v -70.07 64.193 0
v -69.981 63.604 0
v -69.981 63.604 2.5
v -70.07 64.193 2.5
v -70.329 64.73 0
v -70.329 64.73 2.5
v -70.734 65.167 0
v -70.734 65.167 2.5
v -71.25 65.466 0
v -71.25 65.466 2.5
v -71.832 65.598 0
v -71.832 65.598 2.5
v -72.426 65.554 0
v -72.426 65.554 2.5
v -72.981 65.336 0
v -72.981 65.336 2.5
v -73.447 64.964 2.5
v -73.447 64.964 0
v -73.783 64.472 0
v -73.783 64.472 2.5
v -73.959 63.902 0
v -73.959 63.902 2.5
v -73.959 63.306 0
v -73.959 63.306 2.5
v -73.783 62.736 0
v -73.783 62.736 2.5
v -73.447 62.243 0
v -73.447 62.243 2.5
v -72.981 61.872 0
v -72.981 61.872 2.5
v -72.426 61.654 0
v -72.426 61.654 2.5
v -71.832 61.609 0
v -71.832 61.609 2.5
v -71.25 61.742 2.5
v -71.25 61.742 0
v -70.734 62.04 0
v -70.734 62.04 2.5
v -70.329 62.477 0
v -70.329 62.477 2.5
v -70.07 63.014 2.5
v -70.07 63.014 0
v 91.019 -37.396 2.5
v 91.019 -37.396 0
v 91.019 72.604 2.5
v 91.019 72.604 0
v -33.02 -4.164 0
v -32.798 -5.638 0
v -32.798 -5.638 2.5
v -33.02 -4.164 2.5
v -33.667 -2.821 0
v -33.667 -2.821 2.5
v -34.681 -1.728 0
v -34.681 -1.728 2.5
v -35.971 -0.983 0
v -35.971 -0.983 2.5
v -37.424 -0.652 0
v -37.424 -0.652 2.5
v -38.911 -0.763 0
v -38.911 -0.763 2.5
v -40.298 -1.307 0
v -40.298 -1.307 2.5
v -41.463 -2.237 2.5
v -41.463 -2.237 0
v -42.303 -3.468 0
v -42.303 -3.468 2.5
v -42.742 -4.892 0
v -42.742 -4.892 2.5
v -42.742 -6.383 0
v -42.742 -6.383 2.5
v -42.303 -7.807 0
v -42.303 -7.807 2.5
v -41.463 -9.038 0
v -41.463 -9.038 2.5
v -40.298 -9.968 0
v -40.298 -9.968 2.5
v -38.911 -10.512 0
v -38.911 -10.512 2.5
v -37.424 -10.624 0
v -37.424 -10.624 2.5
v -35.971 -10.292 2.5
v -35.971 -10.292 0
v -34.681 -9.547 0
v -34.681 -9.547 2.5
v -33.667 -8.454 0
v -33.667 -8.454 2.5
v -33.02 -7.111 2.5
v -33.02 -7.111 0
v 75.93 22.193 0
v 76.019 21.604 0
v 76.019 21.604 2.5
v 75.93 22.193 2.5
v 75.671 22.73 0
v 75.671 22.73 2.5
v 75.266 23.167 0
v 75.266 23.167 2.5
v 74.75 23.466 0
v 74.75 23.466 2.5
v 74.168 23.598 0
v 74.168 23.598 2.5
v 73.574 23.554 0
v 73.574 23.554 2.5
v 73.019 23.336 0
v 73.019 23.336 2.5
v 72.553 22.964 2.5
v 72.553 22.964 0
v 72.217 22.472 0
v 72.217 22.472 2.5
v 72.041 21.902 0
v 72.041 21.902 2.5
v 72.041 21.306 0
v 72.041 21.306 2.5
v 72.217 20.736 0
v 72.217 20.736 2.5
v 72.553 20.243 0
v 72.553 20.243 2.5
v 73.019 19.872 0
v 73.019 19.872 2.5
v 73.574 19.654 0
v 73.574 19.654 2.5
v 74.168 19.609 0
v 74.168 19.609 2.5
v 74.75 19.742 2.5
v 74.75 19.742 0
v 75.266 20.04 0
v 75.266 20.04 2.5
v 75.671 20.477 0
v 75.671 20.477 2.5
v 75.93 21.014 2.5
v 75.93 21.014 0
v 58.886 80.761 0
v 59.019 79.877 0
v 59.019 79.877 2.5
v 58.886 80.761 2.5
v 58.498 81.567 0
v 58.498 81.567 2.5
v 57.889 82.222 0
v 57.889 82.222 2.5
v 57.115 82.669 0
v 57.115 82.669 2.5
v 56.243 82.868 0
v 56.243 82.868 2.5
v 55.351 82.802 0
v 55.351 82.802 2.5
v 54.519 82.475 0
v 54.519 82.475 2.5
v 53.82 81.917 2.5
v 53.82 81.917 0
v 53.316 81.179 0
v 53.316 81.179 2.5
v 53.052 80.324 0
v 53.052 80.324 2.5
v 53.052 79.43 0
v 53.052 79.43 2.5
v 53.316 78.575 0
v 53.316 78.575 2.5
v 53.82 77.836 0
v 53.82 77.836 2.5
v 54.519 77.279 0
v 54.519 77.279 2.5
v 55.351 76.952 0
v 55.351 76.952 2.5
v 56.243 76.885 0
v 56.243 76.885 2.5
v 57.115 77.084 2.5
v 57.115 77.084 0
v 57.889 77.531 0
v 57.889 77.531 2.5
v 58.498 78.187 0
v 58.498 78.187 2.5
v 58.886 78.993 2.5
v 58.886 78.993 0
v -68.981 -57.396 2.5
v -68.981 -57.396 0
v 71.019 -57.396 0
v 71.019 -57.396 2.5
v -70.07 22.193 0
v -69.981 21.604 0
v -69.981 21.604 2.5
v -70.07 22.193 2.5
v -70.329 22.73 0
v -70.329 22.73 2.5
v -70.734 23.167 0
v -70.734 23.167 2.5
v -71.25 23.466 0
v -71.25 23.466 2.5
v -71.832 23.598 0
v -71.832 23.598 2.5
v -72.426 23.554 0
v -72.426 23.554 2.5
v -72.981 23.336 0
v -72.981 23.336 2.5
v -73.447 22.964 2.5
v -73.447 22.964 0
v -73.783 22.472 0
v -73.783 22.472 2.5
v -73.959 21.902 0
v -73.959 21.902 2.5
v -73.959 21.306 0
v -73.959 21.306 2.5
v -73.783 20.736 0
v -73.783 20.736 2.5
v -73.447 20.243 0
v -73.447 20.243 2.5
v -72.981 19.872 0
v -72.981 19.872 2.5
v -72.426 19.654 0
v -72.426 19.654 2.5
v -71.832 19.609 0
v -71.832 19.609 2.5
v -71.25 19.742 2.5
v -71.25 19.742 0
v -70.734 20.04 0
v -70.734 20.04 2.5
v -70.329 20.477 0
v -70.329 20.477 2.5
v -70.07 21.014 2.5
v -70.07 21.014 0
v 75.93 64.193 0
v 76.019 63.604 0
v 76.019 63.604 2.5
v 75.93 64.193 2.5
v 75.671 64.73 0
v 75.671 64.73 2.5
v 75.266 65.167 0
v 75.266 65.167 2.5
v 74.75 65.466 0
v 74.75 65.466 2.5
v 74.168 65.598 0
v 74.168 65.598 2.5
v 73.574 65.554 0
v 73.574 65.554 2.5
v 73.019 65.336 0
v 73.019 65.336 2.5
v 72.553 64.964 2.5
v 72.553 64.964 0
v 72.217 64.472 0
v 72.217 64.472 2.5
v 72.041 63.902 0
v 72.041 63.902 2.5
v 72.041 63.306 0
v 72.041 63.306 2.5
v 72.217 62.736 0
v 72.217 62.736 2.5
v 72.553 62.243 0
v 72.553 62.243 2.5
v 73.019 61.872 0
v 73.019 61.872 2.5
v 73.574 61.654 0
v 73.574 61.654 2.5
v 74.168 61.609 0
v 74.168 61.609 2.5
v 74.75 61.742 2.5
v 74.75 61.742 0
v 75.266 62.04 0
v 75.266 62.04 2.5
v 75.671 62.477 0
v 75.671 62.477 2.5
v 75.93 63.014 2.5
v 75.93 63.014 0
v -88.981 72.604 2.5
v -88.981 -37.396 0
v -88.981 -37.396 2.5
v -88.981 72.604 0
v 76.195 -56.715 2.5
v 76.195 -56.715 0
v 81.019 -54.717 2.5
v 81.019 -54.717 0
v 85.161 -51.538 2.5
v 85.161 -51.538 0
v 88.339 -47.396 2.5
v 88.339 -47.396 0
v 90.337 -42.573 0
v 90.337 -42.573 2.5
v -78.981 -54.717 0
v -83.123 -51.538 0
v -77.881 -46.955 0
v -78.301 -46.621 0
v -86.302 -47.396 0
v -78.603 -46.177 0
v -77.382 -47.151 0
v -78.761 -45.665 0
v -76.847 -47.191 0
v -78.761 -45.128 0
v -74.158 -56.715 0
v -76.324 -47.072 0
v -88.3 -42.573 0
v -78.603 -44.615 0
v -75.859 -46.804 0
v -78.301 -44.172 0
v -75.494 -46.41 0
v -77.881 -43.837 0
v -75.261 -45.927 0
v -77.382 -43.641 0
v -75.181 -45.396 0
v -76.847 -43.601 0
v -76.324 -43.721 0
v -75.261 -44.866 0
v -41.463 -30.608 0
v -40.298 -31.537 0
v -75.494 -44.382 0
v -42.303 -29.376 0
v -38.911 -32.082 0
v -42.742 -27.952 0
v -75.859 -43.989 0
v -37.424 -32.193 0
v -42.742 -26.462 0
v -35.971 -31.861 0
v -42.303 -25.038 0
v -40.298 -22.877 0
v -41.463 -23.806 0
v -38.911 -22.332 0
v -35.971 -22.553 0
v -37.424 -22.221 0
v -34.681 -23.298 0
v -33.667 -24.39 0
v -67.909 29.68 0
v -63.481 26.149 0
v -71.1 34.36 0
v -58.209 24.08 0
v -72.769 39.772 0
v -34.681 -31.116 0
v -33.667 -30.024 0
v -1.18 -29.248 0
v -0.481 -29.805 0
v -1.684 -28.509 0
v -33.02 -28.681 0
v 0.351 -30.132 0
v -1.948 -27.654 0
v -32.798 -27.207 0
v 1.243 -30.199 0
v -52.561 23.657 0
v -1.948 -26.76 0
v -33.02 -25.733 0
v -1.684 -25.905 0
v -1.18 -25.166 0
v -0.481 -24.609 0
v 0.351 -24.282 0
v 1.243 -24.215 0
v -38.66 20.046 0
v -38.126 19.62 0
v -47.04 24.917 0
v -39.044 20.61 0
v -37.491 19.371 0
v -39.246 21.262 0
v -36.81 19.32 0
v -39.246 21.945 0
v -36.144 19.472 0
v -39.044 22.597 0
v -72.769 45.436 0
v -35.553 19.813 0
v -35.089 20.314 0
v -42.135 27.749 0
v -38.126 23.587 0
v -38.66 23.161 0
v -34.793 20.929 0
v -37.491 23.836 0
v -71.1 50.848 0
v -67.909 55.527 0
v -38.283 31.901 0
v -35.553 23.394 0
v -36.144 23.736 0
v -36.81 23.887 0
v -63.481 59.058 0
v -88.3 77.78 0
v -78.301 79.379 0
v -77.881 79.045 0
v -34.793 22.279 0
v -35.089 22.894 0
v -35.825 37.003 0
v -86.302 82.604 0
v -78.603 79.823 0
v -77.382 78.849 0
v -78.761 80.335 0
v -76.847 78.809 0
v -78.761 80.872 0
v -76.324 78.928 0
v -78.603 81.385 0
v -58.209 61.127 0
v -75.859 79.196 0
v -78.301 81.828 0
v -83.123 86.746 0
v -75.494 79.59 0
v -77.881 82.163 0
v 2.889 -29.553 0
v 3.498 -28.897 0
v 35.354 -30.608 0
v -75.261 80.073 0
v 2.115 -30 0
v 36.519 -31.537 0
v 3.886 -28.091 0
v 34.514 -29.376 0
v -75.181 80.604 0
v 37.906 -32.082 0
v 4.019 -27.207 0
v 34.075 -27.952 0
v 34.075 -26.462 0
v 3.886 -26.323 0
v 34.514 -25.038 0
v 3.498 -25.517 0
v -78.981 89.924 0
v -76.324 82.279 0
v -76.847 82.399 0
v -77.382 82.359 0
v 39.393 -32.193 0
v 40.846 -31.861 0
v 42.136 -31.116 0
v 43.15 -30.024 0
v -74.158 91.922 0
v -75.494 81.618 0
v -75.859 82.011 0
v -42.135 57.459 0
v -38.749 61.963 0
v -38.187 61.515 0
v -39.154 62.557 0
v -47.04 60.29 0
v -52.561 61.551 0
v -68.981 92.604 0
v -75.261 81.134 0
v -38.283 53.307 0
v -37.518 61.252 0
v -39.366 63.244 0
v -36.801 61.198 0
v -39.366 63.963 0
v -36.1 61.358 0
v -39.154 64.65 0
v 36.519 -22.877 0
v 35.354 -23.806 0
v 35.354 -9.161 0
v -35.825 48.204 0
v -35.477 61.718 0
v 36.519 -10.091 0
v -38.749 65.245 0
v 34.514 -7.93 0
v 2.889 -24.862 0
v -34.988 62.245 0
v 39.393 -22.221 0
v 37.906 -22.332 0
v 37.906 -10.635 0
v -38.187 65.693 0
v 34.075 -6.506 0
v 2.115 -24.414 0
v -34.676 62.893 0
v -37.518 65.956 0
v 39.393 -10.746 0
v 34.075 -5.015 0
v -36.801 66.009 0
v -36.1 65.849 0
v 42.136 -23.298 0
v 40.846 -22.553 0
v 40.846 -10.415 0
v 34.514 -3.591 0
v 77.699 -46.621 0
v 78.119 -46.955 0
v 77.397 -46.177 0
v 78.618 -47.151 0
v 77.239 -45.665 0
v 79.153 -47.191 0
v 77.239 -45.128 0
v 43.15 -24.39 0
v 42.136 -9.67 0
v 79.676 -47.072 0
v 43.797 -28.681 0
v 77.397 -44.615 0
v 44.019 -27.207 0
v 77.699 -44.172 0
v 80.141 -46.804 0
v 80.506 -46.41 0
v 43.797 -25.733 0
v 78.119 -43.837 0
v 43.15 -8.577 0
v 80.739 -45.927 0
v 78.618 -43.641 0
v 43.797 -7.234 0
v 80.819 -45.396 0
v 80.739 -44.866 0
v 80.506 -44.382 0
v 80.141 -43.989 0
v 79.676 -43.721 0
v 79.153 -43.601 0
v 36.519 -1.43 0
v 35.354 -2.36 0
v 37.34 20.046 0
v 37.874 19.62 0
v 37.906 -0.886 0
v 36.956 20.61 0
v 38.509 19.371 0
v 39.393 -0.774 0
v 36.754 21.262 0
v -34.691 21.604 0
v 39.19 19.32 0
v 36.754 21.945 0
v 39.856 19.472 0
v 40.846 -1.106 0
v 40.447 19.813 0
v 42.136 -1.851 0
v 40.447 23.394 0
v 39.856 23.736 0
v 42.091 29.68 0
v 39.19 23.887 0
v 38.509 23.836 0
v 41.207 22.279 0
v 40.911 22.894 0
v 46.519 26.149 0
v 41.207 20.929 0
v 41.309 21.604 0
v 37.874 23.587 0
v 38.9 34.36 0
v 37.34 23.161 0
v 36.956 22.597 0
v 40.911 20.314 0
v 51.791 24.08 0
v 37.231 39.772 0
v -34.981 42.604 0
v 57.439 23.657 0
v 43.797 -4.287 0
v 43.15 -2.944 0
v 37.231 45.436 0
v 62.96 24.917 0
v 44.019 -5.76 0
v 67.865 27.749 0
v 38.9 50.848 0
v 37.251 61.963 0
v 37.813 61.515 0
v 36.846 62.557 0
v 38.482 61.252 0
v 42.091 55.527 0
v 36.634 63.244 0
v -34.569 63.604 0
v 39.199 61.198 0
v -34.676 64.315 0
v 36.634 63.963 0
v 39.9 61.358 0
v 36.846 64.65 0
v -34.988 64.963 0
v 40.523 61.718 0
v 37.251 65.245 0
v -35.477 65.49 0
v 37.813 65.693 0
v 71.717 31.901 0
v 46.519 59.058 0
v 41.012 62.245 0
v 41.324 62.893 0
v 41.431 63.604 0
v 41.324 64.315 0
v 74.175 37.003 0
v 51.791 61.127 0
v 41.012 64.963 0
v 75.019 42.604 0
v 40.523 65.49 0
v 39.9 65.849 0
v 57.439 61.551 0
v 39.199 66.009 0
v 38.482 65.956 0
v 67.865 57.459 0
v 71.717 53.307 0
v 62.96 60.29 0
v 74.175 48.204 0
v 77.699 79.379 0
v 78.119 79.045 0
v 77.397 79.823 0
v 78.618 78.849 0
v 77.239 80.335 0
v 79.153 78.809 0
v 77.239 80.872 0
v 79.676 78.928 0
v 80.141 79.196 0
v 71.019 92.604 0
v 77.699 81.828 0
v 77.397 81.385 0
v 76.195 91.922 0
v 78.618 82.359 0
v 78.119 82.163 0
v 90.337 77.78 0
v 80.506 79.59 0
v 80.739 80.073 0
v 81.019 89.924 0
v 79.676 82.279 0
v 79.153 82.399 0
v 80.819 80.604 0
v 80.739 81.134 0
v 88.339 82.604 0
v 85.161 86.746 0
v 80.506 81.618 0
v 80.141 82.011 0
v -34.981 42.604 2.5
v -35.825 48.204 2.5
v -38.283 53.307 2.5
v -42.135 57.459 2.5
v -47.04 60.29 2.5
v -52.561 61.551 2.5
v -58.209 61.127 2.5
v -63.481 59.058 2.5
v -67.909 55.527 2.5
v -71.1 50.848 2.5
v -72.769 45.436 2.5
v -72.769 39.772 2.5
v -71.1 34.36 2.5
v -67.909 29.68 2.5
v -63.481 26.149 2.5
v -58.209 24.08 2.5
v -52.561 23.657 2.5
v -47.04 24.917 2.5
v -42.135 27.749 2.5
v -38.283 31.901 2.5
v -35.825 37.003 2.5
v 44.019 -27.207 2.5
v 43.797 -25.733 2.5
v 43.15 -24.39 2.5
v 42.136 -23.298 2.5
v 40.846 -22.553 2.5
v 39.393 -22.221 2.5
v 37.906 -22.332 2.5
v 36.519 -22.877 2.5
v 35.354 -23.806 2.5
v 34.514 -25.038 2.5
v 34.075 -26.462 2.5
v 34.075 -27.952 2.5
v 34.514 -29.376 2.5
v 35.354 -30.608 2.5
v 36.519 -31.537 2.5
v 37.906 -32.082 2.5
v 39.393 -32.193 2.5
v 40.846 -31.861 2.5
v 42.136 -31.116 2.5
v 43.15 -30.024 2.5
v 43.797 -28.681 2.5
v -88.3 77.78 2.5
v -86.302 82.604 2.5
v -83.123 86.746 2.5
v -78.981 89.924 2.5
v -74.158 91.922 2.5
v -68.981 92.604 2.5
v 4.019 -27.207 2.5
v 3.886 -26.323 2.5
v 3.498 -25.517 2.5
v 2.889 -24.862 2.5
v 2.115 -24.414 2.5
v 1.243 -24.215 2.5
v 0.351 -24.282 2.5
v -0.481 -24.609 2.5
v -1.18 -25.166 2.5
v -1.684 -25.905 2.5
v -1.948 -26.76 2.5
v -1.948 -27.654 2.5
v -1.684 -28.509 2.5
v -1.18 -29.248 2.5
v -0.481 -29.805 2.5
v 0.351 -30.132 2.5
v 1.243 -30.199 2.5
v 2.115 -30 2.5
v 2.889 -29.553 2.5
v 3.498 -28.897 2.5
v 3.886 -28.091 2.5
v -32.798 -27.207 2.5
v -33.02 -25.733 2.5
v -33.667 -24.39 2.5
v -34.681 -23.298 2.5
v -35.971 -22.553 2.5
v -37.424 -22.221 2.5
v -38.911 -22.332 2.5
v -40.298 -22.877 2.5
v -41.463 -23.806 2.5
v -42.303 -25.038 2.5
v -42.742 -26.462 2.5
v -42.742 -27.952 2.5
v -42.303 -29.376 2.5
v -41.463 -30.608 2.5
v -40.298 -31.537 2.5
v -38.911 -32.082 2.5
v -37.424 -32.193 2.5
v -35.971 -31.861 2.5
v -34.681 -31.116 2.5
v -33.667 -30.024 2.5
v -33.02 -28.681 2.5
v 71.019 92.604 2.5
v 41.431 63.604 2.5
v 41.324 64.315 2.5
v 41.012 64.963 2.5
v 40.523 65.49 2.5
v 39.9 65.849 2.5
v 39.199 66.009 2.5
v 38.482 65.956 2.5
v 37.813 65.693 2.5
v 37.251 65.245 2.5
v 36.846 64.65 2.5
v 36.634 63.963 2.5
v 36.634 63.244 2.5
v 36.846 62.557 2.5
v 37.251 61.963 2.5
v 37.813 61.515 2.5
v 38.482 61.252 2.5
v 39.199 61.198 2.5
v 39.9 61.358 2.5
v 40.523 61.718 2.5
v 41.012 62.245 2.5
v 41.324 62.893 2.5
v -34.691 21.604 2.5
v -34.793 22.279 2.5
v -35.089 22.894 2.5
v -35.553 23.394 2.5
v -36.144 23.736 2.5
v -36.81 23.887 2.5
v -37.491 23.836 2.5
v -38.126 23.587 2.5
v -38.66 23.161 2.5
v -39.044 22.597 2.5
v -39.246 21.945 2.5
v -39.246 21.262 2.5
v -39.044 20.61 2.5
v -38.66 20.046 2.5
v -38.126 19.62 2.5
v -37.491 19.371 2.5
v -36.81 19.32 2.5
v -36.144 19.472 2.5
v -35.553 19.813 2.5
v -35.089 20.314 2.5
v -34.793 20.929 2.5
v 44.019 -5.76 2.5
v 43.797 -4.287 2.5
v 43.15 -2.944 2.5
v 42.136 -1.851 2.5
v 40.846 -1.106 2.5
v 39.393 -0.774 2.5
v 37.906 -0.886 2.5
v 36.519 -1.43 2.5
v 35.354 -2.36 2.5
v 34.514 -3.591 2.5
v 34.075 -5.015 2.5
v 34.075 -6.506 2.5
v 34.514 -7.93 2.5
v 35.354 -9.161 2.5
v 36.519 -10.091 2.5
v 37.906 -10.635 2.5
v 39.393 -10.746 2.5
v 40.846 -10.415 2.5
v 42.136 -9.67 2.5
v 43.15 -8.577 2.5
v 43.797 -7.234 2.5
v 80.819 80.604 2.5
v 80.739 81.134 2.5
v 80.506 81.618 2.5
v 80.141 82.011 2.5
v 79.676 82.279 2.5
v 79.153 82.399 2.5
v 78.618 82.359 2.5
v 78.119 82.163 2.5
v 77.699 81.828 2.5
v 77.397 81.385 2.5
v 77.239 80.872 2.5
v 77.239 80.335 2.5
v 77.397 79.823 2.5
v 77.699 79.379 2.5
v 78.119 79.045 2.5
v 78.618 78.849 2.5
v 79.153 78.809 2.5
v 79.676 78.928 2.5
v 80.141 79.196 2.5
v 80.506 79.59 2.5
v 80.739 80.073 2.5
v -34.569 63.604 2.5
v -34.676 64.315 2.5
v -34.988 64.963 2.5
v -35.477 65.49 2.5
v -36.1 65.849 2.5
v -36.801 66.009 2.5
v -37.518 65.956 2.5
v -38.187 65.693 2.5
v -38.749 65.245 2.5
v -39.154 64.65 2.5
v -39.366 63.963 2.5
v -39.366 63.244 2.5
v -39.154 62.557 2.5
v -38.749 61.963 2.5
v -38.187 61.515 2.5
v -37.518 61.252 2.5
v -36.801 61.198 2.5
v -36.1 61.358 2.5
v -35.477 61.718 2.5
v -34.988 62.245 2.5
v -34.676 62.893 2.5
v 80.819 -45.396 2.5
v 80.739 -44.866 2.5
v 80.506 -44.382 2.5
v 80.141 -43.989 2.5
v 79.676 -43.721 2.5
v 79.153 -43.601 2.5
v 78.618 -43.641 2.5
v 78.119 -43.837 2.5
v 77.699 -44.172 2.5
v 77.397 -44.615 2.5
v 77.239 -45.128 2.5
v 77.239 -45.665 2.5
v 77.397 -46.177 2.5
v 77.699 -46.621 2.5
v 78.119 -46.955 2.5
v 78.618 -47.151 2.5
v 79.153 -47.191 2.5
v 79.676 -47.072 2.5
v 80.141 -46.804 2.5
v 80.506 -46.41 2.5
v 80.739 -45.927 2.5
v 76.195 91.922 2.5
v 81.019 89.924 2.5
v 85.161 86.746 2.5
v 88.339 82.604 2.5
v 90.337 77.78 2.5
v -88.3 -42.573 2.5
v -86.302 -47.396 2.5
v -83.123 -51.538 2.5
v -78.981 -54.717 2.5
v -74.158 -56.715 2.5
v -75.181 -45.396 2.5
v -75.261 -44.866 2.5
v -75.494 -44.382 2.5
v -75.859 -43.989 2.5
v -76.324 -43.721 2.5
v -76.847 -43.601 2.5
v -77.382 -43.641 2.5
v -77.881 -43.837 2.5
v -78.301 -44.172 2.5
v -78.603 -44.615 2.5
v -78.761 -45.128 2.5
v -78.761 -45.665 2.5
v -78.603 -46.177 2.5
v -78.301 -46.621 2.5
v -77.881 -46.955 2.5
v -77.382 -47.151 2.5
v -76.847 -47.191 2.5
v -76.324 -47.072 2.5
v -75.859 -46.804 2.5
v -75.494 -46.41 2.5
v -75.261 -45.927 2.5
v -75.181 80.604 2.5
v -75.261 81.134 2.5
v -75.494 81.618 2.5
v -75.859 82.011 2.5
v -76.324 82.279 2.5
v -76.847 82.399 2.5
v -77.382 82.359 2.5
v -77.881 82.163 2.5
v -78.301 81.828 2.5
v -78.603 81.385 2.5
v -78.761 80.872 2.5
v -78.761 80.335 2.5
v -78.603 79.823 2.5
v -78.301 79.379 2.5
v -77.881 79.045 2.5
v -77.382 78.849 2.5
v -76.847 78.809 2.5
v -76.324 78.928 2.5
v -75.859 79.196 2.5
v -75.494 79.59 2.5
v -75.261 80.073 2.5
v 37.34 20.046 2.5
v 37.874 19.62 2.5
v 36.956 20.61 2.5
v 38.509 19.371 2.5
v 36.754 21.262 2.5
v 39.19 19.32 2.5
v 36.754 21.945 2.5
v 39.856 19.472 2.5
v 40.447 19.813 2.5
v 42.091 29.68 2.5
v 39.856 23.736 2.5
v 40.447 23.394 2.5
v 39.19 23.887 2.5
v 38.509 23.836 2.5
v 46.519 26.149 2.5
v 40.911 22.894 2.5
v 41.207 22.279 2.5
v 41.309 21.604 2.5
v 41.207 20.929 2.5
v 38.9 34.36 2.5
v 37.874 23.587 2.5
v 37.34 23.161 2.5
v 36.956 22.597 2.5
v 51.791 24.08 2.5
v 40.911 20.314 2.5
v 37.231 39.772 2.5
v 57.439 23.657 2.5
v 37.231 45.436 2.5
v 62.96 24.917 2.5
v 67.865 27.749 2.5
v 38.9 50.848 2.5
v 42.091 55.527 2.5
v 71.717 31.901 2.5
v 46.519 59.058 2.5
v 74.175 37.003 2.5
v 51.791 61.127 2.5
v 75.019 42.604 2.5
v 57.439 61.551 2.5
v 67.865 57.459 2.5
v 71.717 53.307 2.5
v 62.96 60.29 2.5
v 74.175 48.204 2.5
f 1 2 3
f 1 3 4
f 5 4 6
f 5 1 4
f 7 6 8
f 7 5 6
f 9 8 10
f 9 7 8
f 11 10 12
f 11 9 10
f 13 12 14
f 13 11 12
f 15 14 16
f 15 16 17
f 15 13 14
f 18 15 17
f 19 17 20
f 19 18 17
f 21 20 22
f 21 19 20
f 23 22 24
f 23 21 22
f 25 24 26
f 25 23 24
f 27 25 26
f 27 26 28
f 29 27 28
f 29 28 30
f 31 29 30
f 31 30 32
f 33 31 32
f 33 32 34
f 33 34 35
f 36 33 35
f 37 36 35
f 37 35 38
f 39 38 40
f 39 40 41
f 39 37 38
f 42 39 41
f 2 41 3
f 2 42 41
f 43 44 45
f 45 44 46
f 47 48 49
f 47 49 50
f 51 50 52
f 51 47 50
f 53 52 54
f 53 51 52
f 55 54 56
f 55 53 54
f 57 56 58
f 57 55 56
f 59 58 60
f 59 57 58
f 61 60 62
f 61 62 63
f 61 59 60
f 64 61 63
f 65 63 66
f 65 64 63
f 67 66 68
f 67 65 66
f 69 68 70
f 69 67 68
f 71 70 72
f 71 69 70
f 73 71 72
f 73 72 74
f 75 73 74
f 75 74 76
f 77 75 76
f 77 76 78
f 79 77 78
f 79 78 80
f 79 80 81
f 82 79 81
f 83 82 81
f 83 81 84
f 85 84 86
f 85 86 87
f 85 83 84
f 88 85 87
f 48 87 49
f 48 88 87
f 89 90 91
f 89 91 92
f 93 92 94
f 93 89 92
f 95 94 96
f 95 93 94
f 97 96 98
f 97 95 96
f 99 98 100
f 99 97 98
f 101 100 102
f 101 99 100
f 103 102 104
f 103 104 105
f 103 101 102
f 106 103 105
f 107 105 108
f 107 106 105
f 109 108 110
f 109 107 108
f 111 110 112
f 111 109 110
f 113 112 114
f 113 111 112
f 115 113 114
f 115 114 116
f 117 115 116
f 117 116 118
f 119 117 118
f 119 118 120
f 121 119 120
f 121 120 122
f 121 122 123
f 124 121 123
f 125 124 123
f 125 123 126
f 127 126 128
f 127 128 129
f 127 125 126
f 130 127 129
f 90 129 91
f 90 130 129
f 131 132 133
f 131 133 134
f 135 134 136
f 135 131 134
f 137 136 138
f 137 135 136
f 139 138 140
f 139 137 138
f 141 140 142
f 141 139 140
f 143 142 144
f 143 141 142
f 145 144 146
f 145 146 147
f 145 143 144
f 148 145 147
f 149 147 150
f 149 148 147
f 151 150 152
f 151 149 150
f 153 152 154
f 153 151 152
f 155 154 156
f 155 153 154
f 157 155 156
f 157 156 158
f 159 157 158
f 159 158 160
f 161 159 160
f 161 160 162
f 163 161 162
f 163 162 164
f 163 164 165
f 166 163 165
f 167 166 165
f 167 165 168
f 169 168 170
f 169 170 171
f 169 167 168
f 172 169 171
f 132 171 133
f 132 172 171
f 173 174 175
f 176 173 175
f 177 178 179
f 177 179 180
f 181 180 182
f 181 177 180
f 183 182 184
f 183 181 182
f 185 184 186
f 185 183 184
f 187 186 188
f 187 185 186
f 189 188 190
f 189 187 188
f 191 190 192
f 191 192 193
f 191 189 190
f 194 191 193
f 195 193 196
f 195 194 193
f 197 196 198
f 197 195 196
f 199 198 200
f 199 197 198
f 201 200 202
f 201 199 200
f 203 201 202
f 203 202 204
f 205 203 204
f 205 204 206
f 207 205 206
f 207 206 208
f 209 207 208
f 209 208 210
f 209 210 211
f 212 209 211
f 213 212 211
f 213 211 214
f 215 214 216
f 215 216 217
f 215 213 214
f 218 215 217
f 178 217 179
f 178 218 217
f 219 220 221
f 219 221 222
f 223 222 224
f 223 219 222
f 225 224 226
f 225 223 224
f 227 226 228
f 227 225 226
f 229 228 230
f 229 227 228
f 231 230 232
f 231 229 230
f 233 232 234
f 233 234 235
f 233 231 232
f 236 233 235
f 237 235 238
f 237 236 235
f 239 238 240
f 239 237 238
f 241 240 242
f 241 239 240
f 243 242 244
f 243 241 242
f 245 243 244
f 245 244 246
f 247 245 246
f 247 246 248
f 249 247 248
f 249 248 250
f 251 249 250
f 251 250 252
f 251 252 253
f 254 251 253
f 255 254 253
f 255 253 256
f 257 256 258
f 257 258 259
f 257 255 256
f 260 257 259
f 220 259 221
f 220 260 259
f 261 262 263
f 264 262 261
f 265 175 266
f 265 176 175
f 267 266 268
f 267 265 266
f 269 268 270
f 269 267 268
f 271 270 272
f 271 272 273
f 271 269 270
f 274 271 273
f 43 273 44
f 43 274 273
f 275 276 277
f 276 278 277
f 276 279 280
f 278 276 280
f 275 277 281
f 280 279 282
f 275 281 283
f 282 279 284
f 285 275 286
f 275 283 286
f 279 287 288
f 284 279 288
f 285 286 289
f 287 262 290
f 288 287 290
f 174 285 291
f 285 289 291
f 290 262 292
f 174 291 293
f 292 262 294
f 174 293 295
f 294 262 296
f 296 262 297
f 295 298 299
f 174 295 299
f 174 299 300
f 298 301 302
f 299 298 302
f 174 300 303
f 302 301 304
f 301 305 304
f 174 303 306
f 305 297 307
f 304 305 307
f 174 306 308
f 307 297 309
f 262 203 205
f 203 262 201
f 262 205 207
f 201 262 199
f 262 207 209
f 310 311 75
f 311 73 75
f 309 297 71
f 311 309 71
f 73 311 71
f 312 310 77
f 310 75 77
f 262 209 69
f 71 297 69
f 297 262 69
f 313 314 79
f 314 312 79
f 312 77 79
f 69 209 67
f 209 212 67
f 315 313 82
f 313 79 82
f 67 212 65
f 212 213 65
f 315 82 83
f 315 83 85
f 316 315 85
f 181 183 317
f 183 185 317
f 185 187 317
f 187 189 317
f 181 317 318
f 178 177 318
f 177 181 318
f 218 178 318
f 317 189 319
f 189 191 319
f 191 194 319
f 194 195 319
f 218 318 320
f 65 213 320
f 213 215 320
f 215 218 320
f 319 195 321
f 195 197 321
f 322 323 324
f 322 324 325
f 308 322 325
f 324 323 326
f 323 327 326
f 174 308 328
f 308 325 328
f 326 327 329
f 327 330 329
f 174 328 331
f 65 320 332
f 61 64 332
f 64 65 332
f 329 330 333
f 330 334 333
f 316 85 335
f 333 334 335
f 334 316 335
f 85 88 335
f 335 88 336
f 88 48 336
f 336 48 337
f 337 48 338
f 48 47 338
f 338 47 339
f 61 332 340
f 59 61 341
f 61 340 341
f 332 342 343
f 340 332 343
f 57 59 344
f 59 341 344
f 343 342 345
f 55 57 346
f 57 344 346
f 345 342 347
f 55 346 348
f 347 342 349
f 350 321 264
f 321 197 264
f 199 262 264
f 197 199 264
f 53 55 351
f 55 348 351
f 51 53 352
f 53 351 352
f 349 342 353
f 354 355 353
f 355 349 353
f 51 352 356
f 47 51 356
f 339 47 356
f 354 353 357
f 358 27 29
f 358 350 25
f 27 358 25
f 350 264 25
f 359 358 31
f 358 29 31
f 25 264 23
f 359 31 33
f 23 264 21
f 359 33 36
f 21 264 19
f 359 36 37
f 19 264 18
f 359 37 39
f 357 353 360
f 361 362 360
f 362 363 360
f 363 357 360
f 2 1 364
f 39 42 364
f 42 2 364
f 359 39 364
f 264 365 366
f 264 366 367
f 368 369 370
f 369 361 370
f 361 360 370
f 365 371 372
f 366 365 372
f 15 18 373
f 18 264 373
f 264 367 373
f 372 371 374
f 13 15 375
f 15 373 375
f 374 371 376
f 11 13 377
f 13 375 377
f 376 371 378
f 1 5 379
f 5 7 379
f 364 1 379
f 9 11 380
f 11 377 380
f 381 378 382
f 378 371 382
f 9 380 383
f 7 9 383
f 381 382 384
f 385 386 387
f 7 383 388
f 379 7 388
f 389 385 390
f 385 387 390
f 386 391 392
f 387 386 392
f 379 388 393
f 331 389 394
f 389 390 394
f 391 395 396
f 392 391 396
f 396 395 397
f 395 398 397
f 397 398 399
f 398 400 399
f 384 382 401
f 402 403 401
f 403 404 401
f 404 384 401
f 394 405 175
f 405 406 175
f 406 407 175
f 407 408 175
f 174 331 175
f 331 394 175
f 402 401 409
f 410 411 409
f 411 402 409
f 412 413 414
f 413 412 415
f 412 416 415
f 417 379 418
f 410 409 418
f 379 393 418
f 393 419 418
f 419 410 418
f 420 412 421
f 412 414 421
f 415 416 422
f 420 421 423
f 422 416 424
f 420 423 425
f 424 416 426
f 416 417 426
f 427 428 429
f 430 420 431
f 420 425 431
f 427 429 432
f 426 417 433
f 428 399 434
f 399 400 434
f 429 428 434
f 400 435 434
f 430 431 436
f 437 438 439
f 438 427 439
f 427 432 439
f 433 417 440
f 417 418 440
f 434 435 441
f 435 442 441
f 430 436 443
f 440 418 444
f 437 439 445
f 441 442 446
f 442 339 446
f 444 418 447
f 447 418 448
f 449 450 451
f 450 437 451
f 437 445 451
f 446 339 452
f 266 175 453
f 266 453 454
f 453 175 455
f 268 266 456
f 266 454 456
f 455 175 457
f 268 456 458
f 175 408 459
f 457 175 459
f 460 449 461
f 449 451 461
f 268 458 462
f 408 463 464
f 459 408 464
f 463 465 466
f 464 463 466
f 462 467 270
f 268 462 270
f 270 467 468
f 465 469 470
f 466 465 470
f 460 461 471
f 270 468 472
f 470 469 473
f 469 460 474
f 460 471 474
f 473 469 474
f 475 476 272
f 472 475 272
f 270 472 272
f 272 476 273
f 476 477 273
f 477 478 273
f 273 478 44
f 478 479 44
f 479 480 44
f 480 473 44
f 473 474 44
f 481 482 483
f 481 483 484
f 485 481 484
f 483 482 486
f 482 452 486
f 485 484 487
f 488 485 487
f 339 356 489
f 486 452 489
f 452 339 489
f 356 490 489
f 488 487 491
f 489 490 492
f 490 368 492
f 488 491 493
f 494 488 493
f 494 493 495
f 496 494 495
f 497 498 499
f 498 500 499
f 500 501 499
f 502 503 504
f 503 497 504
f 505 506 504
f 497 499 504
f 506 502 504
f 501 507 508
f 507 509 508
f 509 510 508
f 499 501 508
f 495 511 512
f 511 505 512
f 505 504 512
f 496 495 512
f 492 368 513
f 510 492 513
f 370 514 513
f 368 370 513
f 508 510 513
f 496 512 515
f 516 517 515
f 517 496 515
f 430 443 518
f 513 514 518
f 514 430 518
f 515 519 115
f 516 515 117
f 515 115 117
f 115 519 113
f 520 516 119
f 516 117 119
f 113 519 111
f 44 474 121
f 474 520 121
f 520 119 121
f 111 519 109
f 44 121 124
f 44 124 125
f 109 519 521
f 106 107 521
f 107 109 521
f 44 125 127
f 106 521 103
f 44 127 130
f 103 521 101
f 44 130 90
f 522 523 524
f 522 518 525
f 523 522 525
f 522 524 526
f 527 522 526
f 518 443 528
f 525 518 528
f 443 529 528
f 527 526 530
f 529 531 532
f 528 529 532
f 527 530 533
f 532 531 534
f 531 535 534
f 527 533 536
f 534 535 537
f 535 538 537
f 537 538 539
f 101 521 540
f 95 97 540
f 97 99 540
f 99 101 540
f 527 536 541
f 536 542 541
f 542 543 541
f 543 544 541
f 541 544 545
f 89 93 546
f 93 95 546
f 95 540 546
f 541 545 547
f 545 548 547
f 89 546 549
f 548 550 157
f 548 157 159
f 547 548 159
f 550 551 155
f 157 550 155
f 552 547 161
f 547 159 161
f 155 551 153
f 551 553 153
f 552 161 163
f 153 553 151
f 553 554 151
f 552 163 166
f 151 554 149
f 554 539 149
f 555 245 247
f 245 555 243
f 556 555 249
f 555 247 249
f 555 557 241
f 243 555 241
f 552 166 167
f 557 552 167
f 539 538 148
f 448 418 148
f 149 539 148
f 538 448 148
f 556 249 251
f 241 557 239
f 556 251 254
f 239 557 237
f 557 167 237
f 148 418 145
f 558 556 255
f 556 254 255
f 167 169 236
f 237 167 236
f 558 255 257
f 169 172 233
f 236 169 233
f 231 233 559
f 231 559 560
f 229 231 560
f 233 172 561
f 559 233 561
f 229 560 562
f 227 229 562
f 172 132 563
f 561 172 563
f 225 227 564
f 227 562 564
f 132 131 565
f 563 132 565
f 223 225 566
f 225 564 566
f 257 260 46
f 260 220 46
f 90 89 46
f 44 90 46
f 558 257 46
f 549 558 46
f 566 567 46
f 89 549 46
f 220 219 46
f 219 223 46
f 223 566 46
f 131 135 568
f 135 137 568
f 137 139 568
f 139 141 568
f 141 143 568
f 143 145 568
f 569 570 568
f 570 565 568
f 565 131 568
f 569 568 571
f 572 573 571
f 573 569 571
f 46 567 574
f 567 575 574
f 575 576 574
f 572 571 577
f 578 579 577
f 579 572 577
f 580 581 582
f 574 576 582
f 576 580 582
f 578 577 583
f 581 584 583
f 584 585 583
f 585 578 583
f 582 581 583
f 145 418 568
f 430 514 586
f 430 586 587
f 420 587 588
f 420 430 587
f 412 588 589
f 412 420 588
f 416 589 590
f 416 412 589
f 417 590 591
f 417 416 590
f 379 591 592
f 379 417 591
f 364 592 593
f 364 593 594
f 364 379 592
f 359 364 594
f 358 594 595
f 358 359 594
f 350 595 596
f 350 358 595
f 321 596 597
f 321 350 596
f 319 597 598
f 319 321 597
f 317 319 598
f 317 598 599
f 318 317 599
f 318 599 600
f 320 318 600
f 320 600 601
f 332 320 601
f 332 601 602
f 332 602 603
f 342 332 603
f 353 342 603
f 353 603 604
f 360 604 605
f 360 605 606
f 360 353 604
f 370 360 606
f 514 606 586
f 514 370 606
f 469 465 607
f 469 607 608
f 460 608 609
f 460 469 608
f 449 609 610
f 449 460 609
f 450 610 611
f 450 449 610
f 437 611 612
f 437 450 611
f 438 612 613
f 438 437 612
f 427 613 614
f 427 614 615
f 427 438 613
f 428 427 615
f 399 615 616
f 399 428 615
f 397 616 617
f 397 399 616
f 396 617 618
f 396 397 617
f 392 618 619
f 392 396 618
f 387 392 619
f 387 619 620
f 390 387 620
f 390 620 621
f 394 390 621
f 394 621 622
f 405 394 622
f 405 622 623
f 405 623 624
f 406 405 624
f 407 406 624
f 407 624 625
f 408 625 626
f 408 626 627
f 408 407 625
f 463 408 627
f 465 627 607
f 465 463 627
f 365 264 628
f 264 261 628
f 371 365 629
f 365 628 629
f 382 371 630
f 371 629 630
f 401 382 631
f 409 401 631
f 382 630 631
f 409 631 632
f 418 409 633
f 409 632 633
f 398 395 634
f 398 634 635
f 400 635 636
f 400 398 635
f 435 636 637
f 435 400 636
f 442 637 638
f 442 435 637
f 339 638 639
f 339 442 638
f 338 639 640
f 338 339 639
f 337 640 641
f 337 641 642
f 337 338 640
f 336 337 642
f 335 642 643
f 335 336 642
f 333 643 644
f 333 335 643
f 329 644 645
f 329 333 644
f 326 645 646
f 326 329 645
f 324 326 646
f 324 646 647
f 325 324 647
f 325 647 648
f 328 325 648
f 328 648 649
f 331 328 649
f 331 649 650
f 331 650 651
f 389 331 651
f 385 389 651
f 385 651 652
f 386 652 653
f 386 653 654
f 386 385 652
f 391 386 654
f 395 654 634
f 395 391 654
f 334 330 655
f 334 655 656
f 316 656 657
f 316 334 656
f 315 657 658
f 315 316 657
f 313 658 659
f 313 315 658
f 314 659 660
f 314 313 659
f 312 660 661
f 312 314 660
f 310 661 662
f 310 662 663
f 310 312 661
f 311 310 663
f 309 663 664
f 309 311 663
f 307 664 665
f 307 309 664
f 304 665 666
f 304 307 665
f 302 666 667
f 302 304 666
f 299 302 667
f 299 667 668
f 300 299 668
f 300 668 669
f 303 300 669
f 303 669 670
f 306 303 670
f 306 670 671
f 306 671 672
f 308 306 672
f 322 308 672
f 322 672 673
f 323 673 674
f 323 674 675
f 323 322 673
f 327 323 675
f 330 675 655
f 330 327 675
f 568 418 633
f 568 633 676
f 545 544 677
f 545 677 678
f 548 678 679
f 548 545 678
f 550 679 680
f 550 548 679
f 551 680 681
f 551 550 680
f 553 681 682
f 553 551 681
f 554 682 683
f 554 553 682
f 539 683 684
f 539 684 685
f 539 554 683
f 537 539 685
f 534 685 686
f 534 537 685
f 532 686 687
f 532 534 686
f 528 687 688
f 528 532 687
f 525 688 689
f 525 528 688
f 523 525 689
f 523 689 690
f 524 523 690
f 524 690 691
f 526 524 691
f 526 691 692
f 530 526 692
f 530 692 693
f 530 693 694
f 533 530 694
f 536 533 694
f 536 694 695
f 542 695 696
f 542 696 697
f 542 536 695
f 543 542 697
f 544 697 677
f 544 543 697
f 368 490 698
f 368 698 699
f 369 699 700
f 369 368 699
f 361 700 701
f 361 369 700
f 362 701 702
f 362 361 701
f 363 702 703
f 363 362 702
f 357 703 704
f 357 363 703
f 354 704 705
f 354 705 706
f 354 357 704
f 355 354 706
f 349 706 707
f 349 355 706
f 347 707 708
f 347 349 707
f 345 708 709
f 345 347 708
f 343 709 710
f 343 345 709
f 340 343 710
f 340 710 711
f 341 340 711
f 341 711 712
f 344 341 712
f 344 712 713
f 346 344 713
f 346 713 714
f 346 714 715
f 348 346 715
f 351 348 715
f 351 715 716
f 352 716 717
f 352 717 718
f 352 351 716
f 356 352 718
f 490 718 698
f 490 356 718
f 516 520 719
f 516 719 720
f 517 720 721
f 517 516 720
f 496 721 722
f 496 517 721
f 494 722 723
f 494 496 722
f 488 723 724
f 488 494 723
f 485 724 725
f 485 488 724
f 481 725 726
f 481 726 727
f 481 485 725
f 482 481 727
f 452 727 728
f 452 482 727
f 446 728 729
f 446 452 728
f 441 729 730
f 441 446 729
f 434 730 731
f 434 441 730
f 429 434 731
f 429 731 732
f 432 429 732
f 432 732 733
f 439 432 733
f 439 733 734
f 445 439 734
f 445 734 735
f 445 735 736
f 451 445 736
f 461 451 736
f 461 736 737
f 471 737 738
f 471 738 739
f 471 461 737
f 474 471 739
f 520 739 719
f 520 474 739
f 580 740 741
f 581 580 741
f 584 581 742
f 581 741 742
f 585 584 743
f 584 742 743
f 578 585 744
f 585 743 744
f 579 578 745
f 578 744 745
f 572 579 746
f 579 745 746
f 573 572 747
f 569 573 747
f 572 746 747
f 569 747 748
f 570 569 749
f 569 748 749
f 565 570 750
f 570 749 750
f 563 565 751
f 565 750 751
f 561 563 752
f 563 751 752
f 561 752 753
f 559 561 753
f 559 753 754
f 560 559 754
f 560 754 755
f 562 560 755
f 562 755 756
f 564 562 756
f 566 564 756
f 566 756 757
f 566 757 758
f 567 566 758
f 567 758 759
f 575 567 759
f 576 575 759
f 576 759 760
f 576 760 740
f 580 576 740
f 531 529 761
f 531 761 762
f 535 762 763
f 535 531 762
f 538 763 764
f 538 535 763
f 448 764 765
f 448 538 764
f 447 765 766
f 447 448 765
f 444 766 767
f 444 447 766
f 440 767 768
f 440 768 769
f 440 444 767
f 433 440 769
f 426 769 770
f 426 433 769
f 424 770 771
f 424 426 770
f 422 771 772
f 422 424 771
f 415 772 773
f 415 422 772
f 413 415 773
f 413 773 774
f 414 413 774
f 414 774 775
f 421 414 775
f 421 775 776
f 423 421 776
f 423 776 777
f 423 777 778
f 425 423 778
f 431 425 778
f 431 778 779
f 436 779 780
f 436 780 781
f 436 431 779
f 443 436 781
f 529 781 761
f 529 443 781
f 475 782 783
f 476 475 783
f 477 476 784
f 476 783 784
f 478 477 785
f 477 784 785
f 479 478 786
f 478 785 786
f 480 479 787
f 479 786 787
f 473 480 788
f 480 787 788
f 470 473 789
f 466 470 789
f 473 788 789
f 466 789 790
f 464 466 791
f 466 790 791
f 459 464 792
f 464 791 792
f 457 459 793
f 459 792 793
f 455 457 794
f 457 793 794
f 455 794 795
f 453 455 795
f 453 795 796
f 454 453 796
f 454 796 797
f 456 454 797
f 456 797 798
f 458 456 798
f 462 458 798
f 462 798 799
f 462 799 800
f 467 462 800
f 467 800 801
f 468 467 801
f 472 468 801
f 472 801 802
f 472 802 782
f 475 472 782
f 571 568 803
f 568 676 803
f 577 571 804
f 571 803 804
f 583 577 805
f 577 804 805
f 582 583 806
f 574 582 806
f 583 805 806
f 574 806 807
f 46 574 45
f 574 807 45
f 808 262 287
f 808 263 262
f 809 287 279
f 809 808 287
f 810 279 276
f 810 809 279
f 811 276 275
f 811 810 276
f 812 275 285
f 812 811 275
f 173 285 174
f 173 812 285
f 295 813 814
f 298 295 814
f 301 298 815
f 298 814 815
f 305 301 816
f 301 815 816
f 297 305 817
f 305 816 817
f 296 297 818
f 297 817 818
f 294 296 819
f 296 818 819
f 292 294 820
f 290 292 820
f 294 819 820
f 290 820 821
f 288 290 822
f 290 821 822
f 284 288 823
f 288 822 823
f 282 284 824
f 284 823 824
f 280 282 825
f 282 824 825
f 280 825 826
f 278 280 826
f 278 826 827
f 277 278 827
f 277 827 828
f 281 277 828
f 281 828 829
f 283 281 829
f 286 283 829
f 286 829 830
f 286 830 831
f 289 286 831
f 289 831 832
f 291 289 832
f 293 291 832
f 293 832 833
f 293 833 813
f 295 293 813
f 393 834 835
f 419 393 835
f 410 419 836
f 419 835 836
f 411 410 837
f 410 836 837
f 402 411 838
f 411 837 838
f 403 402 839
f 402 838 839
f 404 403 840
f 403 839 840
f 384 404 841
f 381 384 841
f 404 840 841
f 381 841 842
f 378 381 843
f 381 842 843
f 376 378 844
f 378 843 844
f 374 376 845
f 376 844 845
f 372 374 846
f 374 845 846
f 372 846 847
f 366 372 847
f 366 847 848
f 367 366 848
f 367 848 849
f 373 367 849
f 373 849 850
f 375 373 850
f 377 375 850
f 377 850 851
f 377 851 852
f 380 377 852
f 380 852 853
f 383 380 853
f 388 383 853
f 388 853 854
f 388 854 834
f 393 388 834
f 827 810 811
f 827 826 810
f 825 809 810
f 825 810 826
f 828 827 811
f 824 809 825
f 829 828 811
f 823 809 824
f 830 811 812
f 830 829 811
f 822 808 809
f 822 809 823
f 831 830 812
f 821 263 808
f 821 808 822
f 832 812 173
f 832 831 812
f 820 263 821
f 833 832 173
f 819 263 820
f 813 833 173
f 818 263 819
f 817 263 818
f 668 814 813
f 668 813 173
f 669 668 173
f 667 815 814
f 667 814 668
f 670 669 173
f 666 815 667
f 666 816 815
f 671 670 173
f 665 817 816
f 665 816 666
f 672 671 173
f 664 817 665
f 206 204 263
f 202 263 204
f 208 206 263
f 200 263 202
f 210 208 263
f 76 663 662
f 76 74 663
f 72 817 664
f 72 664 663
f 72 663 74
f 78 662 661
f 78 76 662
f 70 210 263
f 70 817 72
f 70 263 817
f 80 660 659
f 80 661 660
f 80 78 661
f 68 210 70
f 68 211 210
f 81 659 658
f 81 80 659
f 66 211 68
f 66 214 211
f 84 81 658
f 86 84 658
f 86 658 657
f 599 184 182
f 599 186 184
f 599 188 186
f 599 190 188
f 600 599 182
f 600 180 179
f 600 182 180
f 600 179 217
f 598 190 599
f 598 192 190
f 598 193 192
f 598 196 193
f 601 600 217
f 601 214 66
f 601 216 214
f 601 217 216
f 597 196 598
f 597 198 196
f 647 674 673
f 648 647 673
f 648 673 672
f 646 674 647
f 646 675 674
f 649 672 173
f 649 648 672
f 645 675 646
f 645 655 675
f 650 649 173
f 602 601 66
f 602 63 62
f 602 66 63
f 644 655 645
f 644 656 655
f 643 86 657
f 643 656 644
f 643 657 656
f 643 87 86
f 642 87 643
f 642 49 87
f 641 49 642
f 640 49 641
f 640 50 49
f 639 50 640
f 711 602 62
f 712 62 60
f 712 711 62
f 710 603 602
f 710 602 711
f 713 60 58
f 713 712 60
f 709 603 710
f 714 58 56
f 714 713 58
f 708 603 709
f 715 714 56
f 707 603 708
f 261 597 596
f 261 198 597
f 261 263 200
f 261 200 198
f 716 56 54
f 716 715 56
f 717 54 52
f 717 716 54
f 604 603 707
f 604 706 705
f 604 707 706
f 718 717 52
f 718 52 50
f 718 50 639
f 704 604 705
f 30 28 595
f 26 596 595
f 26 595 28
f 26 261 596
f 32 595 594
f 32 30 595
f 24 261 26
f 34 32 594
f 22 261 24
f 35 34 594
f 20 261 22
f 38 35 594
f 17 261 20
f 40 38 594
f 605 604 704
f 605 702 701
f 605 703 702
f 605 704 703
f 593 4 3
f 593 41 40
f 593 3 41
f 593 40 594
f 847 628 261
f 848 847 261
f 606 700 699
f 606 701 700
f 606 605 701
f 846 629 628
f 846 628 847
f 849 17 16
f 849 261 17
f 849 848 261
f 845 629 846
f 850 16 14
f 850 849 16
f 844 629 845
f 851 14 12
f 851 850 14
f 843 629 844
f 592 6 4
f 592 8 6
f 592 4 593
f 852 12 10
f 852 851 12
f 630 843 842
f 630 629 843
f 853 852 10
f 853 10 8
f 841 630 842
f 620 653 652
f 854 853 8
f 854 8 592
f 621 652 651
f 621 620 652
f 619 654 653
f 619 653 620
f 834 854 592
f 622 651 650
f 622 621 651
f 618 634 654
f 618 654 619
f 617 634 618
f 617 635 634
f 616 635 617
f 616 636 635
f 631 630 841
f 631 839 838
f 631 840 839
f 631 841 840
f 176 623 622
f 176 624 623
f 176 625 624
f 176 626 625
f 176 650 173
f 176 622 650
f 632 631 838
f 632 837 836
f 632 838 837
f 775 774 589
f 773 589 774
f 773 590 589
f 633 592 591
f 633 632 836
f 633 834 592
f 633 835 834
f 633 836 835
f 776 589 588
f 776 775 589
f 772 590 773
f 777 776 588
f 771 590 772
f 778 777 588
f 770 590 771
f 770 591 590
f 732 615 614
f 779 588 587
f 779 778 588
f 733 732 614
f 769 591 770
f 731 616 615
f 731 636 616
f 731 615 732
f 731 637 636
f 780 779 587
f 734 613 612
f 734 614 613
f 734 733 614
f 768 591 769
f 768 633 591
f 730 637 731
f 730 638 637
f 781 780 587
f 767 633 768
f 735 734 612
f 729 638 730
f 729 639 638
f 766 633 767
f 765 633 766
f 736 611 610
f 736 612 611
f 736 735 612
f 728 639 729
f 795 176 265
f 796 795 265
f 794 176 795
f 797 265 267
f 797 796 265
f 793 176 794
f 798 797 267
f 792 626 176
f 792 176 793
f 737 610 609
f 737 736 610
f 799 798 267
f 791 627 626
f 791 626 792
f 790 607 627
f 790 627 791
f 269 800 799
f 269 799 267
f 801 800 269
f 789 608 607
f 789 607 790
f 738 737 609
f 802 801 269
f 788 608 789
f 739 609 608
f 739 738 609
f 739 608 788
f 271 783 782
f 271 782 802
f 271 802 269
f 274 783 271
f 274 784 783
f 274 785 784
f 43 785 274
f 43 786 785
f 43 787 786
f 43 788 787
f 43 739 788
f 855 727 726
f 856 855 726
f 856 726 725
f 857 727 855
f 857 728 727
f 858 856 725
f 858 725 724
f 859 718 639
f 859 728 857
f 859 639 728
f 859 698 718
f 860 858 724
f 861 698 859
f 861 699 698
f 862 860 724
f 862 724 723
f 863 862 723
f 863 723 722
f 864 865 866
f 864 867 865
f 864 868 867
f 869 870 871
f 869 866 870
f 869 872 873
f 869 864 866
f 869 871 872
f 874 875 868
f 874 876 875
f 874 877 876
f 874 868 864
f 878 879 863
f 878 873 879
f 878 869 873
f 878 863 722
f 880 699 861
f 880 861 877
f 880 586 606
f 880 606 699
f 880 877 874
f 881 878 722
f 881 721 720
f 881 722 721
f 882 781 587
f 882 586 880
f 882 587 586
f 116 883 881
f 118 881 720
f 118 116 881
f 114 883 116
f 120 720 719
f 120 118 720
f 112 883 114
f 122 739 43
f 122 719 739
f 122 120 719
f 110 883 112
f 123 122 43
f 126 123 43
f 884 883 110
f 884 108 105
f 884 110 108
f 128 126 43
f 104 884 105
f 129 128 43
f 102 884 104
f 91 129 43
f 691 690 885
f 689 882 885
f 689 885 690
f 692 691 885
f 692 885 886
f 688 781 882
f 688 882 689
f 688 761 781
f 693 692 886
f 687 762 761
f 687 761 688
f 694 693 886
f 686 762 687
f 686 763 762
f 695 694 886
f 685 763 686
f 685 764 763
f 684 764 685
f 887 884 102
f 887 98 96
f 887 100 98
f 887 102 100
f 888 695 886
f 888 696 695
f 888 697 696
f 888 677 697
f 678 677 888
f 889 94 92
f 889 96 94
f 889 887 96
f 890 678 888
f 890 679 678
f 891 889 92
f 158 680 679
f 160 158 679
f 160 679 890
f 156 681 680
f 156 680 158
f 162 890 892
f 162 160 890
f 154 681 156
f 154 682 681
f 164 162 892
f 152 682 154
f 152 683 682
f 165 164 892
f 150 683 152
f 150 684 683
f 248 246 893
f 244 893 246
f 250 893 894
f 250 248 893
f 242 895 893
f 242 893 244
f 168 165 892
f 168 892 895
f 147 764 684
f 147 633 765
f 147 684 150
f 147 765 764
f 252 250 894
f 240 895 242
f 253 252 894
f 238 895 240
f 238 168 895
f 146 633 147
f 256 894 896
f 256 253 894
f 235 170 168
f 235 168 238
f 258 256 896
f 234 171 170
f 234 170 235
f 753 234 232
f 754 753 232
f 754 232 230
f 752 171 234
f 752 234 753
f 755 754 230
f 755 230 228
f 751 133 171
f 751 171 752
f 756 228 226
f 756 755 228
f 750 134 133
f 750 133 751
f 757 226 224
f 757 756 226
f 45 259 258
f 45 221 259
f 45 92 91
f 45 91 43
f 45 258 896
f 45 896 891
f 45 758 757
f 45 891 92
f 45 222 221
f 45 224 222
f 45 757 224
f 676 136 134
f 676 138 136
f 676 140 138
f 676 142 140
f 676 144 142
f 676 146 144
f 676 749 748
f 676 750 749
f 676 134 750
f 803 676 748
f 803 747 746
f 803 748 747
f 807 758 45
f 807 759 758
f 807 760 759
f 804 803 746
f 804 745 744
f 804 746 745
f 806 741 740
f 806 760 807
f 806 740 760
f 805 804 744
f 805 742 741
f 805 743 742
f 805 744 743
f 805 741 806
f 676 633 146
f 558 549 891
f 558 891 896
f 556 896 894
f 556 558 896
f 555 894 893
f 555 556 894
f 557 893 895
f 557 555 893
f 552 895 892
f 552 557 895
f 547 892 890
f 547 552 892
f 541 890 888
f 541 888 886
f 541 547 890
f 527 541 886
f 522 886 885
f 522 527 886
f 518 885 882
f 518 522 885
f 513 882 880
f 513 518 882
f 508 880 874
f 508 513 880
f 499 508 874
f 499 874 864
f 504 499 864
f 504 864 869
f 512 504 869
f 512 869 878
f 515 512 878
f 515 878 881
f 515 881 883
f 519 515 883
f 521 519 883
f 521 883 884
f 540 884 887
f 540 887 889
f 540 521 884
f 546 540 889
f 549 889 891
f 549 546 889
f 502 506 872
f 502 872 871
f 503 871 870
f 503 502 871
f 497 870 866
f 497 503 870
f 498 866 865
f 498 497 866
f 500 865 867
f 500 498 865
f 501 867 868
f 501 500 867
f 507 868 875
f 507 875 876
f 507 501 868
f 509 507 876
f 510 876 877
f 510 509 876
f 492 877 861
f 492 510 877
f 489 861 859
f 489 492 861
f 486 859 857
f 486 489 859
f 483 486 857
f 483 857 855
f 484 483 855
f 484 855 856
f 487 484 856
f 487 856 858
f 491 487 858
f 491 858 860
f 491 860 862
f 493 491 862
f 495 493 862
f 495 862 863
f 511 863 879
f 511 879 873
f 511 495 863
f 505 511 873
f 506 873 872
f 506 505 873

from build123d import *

# Parameters (mm, degrees)
SKETCH1_W           = 180
SKETCH1_H           = 150
SKETCH1_R           = 19
SKETCH1_R_2         = 2
SKETCH1_R_3         = 2.412227545
SKETCH1_R_4         = 2.29012976
SKETCH1_R_5         = 5
SKETCH1_R_6         = 3
BOSS_EXTRUDE3_DEPTH = 2.5
FILLET2_R           = 20
CUT_EXTRUDE1_REACH  = 4.5
SKETCH2_R           = 1.8


with BuildPart() as part:
    # Sketch1 → Boss-Extrude3 (new body)
    with BuildSketch(Plane.XY):
        with Locations((1.018867925, 17.603773585)):
            Rectangle(SKETCH1_W, SKETCH1_H)
        with Locations((-53.981132075, 42.603773585)):
            Circle(SKETCH1_R, mode=Mode.SUBTRACT)
        with Locations((-71.981132075, 63.603773585)):
            Circle(SKETCH1_R_2, mode=Mode.SUBTRACT)
        with Locations((-71.981132075, 21.603773585)):
            Circle(SKETCH1_R_2, mode=Mode.SUBTRACT)
        with Locations((-36.981132075, 63.603773585)):
            Circle(SKETCH1_R_3, mode=Mode.SUBTRACT)
        with Locations((-36.981132075, 21.603773585)):
            Circle(SKETCH1_R_4, mode=Mode.SUBTRACT)
        with Locations((39.018867925, 63.603773585)):
            Circle(SKETCH1_R_3, mode=Mode.SUBTRACT)
        with Locations((74.018867925, 63.603773585)):
            Circle(SKETCH1_R_2, mode=Mode.SUBTRACT)
        with Locations((74.018867925, 21.603773585)):
            Circle(SKETCH1_R_2, mode=Mode.SUBTRACT)
        with Locations((39.018867925, 21.603773585)):
            Circle(SKETCH1_R_4, mode=Mode.SUBTRACT)
        with Locations((56.018867925, 42.603773585)):
            Circle(SKETCH1_R, mode=Mode.SUBTRACT)
        with Locations((-37.797961742, -27.20701666)):
            Circle(SKETCH1_R_5, mode=Mode.SUBTRACT)
        with Locations((-37.797961742, -5.637572315)):
            Circle(SKETCH1_R_5, mode=Mode.SUBTRACT)
        with Locations((39.018867925, -5.760467761)):
            Circle(SKETCH1_R_5, mode=Mode.SUBTRACT)
        with Locations((1.018867925, -27.20701666)):
            Circle(SKETCH1_R_6, mode=Mode.SUBTRACT)
        with Locations((39.018867925, -27.20701666)):
            Circle(SKETCH1_R_5, mode=Mode.SUBTRACT)
        with Locations((56.018867925, 79.876860749)):
            Circle(SKETCH1_R_6, mode=Mode.SUBTRACT)
    extrude(amount=BOSS_EXTRUDE3_DEPTH)

    # Fillet2
    fillet2_edges = [part.edges().sort_by_distance(p)[0] for p in [
        (91.018867925, -57.396226415, 1.25),
        (-88.981132075, -57.396226415, 1.25),
        (-88.981132075, 92.603773585, 1.25),
        (91.018867925, 92.603773585, 1.25),
    ]]
    fillet(fillet2_edges, radius=FILLET2_R)

    # Sketch2 → Cut-Extrude1 (cut, up to next)
    with BuildSketch(Plane.XY.offset(2.5), mode=Mode.PRIVATE) as cut_extrude1_sk1:
        with Locations((-76.981132075, -45.396226415)):
            Circle(SKETCH2_R)
    cut_extrude1_tool1 = extrude(cut_extrude1_sk1.sketch, amount=-CUT_EXTRUDE1_REACH, mode=Mode.PRIVATE) & part.part
    add(cut_extrude1_tool1.solids().sort_by_distance((-76.981132, -45.396226, 2.5))[0], mode=Mode.SUBTRACT)
    # Sketch2 → Cut-Extrude1 (cut, up to next)
    with BuildSketch(Plane.XY.offset(2.5), mode=Mode.PRIVATE) as cut_extrude1_sk2:
        with Locations((79.018867925, -45.396226415)):
            Circle(SKETCH2_R)
    cut_extrude1_tool2 = extrude(cut_extrude1_sk2.sketch, amount=-CUT_EXTRUDE1_REACH, mode=Mode.PRIVATE) & part.part
    add(cut_extrude1_tool2.solids().sort_by_distance((79.018868, -45.396226, 2.5))[0], mode=Mode.SUBTRACT)
    # Sketch2 → Cut-Extrude1 (cut, up to next)
    with BuildSketch(Plane.XY.offset(2.5), mode=Mode.PRIVATE) as cut_extrude1_sk3:
        with Locations((-76.981132075, 80.603773585)):
            Circle(SKETCH2_R)
    cut_extrude1_tool3 = extrude(cut_extrude1_sk3.sketch, amount=-CUT_EXTRUDE1_REACH, mode=Mode.PRIVATE) & part.part
    add(cut_extrude1_tool3.solids().sort_by_distance((-76.981132, 80.603774, 2.5))[0], mode=Mode.SUBTRACT)
    # Sketch2 → Cut-Extrude1 (cut, up to next)
    with BuildSketch(Plane.XY.offset(2.5), mode=Mode.PRIVATE) as cut_extrude1_sk4:
        with Locations((79.018867925, 80.603773585)):
            Circle(SKETCH2_R)
    cut_extrude1_tool4 = extrude(cut_extrude1_sk4.sketch, amount=-CUT_EXTRUDE1_REACH, mode=Mode.PRIVATE) & part.part
    add(cut_extrude1_tool4.solids().sort_by_distance((79.018868, 80.603774, 2.5))[0], mode=Mode.SUBTRACT)


solid = part.part
